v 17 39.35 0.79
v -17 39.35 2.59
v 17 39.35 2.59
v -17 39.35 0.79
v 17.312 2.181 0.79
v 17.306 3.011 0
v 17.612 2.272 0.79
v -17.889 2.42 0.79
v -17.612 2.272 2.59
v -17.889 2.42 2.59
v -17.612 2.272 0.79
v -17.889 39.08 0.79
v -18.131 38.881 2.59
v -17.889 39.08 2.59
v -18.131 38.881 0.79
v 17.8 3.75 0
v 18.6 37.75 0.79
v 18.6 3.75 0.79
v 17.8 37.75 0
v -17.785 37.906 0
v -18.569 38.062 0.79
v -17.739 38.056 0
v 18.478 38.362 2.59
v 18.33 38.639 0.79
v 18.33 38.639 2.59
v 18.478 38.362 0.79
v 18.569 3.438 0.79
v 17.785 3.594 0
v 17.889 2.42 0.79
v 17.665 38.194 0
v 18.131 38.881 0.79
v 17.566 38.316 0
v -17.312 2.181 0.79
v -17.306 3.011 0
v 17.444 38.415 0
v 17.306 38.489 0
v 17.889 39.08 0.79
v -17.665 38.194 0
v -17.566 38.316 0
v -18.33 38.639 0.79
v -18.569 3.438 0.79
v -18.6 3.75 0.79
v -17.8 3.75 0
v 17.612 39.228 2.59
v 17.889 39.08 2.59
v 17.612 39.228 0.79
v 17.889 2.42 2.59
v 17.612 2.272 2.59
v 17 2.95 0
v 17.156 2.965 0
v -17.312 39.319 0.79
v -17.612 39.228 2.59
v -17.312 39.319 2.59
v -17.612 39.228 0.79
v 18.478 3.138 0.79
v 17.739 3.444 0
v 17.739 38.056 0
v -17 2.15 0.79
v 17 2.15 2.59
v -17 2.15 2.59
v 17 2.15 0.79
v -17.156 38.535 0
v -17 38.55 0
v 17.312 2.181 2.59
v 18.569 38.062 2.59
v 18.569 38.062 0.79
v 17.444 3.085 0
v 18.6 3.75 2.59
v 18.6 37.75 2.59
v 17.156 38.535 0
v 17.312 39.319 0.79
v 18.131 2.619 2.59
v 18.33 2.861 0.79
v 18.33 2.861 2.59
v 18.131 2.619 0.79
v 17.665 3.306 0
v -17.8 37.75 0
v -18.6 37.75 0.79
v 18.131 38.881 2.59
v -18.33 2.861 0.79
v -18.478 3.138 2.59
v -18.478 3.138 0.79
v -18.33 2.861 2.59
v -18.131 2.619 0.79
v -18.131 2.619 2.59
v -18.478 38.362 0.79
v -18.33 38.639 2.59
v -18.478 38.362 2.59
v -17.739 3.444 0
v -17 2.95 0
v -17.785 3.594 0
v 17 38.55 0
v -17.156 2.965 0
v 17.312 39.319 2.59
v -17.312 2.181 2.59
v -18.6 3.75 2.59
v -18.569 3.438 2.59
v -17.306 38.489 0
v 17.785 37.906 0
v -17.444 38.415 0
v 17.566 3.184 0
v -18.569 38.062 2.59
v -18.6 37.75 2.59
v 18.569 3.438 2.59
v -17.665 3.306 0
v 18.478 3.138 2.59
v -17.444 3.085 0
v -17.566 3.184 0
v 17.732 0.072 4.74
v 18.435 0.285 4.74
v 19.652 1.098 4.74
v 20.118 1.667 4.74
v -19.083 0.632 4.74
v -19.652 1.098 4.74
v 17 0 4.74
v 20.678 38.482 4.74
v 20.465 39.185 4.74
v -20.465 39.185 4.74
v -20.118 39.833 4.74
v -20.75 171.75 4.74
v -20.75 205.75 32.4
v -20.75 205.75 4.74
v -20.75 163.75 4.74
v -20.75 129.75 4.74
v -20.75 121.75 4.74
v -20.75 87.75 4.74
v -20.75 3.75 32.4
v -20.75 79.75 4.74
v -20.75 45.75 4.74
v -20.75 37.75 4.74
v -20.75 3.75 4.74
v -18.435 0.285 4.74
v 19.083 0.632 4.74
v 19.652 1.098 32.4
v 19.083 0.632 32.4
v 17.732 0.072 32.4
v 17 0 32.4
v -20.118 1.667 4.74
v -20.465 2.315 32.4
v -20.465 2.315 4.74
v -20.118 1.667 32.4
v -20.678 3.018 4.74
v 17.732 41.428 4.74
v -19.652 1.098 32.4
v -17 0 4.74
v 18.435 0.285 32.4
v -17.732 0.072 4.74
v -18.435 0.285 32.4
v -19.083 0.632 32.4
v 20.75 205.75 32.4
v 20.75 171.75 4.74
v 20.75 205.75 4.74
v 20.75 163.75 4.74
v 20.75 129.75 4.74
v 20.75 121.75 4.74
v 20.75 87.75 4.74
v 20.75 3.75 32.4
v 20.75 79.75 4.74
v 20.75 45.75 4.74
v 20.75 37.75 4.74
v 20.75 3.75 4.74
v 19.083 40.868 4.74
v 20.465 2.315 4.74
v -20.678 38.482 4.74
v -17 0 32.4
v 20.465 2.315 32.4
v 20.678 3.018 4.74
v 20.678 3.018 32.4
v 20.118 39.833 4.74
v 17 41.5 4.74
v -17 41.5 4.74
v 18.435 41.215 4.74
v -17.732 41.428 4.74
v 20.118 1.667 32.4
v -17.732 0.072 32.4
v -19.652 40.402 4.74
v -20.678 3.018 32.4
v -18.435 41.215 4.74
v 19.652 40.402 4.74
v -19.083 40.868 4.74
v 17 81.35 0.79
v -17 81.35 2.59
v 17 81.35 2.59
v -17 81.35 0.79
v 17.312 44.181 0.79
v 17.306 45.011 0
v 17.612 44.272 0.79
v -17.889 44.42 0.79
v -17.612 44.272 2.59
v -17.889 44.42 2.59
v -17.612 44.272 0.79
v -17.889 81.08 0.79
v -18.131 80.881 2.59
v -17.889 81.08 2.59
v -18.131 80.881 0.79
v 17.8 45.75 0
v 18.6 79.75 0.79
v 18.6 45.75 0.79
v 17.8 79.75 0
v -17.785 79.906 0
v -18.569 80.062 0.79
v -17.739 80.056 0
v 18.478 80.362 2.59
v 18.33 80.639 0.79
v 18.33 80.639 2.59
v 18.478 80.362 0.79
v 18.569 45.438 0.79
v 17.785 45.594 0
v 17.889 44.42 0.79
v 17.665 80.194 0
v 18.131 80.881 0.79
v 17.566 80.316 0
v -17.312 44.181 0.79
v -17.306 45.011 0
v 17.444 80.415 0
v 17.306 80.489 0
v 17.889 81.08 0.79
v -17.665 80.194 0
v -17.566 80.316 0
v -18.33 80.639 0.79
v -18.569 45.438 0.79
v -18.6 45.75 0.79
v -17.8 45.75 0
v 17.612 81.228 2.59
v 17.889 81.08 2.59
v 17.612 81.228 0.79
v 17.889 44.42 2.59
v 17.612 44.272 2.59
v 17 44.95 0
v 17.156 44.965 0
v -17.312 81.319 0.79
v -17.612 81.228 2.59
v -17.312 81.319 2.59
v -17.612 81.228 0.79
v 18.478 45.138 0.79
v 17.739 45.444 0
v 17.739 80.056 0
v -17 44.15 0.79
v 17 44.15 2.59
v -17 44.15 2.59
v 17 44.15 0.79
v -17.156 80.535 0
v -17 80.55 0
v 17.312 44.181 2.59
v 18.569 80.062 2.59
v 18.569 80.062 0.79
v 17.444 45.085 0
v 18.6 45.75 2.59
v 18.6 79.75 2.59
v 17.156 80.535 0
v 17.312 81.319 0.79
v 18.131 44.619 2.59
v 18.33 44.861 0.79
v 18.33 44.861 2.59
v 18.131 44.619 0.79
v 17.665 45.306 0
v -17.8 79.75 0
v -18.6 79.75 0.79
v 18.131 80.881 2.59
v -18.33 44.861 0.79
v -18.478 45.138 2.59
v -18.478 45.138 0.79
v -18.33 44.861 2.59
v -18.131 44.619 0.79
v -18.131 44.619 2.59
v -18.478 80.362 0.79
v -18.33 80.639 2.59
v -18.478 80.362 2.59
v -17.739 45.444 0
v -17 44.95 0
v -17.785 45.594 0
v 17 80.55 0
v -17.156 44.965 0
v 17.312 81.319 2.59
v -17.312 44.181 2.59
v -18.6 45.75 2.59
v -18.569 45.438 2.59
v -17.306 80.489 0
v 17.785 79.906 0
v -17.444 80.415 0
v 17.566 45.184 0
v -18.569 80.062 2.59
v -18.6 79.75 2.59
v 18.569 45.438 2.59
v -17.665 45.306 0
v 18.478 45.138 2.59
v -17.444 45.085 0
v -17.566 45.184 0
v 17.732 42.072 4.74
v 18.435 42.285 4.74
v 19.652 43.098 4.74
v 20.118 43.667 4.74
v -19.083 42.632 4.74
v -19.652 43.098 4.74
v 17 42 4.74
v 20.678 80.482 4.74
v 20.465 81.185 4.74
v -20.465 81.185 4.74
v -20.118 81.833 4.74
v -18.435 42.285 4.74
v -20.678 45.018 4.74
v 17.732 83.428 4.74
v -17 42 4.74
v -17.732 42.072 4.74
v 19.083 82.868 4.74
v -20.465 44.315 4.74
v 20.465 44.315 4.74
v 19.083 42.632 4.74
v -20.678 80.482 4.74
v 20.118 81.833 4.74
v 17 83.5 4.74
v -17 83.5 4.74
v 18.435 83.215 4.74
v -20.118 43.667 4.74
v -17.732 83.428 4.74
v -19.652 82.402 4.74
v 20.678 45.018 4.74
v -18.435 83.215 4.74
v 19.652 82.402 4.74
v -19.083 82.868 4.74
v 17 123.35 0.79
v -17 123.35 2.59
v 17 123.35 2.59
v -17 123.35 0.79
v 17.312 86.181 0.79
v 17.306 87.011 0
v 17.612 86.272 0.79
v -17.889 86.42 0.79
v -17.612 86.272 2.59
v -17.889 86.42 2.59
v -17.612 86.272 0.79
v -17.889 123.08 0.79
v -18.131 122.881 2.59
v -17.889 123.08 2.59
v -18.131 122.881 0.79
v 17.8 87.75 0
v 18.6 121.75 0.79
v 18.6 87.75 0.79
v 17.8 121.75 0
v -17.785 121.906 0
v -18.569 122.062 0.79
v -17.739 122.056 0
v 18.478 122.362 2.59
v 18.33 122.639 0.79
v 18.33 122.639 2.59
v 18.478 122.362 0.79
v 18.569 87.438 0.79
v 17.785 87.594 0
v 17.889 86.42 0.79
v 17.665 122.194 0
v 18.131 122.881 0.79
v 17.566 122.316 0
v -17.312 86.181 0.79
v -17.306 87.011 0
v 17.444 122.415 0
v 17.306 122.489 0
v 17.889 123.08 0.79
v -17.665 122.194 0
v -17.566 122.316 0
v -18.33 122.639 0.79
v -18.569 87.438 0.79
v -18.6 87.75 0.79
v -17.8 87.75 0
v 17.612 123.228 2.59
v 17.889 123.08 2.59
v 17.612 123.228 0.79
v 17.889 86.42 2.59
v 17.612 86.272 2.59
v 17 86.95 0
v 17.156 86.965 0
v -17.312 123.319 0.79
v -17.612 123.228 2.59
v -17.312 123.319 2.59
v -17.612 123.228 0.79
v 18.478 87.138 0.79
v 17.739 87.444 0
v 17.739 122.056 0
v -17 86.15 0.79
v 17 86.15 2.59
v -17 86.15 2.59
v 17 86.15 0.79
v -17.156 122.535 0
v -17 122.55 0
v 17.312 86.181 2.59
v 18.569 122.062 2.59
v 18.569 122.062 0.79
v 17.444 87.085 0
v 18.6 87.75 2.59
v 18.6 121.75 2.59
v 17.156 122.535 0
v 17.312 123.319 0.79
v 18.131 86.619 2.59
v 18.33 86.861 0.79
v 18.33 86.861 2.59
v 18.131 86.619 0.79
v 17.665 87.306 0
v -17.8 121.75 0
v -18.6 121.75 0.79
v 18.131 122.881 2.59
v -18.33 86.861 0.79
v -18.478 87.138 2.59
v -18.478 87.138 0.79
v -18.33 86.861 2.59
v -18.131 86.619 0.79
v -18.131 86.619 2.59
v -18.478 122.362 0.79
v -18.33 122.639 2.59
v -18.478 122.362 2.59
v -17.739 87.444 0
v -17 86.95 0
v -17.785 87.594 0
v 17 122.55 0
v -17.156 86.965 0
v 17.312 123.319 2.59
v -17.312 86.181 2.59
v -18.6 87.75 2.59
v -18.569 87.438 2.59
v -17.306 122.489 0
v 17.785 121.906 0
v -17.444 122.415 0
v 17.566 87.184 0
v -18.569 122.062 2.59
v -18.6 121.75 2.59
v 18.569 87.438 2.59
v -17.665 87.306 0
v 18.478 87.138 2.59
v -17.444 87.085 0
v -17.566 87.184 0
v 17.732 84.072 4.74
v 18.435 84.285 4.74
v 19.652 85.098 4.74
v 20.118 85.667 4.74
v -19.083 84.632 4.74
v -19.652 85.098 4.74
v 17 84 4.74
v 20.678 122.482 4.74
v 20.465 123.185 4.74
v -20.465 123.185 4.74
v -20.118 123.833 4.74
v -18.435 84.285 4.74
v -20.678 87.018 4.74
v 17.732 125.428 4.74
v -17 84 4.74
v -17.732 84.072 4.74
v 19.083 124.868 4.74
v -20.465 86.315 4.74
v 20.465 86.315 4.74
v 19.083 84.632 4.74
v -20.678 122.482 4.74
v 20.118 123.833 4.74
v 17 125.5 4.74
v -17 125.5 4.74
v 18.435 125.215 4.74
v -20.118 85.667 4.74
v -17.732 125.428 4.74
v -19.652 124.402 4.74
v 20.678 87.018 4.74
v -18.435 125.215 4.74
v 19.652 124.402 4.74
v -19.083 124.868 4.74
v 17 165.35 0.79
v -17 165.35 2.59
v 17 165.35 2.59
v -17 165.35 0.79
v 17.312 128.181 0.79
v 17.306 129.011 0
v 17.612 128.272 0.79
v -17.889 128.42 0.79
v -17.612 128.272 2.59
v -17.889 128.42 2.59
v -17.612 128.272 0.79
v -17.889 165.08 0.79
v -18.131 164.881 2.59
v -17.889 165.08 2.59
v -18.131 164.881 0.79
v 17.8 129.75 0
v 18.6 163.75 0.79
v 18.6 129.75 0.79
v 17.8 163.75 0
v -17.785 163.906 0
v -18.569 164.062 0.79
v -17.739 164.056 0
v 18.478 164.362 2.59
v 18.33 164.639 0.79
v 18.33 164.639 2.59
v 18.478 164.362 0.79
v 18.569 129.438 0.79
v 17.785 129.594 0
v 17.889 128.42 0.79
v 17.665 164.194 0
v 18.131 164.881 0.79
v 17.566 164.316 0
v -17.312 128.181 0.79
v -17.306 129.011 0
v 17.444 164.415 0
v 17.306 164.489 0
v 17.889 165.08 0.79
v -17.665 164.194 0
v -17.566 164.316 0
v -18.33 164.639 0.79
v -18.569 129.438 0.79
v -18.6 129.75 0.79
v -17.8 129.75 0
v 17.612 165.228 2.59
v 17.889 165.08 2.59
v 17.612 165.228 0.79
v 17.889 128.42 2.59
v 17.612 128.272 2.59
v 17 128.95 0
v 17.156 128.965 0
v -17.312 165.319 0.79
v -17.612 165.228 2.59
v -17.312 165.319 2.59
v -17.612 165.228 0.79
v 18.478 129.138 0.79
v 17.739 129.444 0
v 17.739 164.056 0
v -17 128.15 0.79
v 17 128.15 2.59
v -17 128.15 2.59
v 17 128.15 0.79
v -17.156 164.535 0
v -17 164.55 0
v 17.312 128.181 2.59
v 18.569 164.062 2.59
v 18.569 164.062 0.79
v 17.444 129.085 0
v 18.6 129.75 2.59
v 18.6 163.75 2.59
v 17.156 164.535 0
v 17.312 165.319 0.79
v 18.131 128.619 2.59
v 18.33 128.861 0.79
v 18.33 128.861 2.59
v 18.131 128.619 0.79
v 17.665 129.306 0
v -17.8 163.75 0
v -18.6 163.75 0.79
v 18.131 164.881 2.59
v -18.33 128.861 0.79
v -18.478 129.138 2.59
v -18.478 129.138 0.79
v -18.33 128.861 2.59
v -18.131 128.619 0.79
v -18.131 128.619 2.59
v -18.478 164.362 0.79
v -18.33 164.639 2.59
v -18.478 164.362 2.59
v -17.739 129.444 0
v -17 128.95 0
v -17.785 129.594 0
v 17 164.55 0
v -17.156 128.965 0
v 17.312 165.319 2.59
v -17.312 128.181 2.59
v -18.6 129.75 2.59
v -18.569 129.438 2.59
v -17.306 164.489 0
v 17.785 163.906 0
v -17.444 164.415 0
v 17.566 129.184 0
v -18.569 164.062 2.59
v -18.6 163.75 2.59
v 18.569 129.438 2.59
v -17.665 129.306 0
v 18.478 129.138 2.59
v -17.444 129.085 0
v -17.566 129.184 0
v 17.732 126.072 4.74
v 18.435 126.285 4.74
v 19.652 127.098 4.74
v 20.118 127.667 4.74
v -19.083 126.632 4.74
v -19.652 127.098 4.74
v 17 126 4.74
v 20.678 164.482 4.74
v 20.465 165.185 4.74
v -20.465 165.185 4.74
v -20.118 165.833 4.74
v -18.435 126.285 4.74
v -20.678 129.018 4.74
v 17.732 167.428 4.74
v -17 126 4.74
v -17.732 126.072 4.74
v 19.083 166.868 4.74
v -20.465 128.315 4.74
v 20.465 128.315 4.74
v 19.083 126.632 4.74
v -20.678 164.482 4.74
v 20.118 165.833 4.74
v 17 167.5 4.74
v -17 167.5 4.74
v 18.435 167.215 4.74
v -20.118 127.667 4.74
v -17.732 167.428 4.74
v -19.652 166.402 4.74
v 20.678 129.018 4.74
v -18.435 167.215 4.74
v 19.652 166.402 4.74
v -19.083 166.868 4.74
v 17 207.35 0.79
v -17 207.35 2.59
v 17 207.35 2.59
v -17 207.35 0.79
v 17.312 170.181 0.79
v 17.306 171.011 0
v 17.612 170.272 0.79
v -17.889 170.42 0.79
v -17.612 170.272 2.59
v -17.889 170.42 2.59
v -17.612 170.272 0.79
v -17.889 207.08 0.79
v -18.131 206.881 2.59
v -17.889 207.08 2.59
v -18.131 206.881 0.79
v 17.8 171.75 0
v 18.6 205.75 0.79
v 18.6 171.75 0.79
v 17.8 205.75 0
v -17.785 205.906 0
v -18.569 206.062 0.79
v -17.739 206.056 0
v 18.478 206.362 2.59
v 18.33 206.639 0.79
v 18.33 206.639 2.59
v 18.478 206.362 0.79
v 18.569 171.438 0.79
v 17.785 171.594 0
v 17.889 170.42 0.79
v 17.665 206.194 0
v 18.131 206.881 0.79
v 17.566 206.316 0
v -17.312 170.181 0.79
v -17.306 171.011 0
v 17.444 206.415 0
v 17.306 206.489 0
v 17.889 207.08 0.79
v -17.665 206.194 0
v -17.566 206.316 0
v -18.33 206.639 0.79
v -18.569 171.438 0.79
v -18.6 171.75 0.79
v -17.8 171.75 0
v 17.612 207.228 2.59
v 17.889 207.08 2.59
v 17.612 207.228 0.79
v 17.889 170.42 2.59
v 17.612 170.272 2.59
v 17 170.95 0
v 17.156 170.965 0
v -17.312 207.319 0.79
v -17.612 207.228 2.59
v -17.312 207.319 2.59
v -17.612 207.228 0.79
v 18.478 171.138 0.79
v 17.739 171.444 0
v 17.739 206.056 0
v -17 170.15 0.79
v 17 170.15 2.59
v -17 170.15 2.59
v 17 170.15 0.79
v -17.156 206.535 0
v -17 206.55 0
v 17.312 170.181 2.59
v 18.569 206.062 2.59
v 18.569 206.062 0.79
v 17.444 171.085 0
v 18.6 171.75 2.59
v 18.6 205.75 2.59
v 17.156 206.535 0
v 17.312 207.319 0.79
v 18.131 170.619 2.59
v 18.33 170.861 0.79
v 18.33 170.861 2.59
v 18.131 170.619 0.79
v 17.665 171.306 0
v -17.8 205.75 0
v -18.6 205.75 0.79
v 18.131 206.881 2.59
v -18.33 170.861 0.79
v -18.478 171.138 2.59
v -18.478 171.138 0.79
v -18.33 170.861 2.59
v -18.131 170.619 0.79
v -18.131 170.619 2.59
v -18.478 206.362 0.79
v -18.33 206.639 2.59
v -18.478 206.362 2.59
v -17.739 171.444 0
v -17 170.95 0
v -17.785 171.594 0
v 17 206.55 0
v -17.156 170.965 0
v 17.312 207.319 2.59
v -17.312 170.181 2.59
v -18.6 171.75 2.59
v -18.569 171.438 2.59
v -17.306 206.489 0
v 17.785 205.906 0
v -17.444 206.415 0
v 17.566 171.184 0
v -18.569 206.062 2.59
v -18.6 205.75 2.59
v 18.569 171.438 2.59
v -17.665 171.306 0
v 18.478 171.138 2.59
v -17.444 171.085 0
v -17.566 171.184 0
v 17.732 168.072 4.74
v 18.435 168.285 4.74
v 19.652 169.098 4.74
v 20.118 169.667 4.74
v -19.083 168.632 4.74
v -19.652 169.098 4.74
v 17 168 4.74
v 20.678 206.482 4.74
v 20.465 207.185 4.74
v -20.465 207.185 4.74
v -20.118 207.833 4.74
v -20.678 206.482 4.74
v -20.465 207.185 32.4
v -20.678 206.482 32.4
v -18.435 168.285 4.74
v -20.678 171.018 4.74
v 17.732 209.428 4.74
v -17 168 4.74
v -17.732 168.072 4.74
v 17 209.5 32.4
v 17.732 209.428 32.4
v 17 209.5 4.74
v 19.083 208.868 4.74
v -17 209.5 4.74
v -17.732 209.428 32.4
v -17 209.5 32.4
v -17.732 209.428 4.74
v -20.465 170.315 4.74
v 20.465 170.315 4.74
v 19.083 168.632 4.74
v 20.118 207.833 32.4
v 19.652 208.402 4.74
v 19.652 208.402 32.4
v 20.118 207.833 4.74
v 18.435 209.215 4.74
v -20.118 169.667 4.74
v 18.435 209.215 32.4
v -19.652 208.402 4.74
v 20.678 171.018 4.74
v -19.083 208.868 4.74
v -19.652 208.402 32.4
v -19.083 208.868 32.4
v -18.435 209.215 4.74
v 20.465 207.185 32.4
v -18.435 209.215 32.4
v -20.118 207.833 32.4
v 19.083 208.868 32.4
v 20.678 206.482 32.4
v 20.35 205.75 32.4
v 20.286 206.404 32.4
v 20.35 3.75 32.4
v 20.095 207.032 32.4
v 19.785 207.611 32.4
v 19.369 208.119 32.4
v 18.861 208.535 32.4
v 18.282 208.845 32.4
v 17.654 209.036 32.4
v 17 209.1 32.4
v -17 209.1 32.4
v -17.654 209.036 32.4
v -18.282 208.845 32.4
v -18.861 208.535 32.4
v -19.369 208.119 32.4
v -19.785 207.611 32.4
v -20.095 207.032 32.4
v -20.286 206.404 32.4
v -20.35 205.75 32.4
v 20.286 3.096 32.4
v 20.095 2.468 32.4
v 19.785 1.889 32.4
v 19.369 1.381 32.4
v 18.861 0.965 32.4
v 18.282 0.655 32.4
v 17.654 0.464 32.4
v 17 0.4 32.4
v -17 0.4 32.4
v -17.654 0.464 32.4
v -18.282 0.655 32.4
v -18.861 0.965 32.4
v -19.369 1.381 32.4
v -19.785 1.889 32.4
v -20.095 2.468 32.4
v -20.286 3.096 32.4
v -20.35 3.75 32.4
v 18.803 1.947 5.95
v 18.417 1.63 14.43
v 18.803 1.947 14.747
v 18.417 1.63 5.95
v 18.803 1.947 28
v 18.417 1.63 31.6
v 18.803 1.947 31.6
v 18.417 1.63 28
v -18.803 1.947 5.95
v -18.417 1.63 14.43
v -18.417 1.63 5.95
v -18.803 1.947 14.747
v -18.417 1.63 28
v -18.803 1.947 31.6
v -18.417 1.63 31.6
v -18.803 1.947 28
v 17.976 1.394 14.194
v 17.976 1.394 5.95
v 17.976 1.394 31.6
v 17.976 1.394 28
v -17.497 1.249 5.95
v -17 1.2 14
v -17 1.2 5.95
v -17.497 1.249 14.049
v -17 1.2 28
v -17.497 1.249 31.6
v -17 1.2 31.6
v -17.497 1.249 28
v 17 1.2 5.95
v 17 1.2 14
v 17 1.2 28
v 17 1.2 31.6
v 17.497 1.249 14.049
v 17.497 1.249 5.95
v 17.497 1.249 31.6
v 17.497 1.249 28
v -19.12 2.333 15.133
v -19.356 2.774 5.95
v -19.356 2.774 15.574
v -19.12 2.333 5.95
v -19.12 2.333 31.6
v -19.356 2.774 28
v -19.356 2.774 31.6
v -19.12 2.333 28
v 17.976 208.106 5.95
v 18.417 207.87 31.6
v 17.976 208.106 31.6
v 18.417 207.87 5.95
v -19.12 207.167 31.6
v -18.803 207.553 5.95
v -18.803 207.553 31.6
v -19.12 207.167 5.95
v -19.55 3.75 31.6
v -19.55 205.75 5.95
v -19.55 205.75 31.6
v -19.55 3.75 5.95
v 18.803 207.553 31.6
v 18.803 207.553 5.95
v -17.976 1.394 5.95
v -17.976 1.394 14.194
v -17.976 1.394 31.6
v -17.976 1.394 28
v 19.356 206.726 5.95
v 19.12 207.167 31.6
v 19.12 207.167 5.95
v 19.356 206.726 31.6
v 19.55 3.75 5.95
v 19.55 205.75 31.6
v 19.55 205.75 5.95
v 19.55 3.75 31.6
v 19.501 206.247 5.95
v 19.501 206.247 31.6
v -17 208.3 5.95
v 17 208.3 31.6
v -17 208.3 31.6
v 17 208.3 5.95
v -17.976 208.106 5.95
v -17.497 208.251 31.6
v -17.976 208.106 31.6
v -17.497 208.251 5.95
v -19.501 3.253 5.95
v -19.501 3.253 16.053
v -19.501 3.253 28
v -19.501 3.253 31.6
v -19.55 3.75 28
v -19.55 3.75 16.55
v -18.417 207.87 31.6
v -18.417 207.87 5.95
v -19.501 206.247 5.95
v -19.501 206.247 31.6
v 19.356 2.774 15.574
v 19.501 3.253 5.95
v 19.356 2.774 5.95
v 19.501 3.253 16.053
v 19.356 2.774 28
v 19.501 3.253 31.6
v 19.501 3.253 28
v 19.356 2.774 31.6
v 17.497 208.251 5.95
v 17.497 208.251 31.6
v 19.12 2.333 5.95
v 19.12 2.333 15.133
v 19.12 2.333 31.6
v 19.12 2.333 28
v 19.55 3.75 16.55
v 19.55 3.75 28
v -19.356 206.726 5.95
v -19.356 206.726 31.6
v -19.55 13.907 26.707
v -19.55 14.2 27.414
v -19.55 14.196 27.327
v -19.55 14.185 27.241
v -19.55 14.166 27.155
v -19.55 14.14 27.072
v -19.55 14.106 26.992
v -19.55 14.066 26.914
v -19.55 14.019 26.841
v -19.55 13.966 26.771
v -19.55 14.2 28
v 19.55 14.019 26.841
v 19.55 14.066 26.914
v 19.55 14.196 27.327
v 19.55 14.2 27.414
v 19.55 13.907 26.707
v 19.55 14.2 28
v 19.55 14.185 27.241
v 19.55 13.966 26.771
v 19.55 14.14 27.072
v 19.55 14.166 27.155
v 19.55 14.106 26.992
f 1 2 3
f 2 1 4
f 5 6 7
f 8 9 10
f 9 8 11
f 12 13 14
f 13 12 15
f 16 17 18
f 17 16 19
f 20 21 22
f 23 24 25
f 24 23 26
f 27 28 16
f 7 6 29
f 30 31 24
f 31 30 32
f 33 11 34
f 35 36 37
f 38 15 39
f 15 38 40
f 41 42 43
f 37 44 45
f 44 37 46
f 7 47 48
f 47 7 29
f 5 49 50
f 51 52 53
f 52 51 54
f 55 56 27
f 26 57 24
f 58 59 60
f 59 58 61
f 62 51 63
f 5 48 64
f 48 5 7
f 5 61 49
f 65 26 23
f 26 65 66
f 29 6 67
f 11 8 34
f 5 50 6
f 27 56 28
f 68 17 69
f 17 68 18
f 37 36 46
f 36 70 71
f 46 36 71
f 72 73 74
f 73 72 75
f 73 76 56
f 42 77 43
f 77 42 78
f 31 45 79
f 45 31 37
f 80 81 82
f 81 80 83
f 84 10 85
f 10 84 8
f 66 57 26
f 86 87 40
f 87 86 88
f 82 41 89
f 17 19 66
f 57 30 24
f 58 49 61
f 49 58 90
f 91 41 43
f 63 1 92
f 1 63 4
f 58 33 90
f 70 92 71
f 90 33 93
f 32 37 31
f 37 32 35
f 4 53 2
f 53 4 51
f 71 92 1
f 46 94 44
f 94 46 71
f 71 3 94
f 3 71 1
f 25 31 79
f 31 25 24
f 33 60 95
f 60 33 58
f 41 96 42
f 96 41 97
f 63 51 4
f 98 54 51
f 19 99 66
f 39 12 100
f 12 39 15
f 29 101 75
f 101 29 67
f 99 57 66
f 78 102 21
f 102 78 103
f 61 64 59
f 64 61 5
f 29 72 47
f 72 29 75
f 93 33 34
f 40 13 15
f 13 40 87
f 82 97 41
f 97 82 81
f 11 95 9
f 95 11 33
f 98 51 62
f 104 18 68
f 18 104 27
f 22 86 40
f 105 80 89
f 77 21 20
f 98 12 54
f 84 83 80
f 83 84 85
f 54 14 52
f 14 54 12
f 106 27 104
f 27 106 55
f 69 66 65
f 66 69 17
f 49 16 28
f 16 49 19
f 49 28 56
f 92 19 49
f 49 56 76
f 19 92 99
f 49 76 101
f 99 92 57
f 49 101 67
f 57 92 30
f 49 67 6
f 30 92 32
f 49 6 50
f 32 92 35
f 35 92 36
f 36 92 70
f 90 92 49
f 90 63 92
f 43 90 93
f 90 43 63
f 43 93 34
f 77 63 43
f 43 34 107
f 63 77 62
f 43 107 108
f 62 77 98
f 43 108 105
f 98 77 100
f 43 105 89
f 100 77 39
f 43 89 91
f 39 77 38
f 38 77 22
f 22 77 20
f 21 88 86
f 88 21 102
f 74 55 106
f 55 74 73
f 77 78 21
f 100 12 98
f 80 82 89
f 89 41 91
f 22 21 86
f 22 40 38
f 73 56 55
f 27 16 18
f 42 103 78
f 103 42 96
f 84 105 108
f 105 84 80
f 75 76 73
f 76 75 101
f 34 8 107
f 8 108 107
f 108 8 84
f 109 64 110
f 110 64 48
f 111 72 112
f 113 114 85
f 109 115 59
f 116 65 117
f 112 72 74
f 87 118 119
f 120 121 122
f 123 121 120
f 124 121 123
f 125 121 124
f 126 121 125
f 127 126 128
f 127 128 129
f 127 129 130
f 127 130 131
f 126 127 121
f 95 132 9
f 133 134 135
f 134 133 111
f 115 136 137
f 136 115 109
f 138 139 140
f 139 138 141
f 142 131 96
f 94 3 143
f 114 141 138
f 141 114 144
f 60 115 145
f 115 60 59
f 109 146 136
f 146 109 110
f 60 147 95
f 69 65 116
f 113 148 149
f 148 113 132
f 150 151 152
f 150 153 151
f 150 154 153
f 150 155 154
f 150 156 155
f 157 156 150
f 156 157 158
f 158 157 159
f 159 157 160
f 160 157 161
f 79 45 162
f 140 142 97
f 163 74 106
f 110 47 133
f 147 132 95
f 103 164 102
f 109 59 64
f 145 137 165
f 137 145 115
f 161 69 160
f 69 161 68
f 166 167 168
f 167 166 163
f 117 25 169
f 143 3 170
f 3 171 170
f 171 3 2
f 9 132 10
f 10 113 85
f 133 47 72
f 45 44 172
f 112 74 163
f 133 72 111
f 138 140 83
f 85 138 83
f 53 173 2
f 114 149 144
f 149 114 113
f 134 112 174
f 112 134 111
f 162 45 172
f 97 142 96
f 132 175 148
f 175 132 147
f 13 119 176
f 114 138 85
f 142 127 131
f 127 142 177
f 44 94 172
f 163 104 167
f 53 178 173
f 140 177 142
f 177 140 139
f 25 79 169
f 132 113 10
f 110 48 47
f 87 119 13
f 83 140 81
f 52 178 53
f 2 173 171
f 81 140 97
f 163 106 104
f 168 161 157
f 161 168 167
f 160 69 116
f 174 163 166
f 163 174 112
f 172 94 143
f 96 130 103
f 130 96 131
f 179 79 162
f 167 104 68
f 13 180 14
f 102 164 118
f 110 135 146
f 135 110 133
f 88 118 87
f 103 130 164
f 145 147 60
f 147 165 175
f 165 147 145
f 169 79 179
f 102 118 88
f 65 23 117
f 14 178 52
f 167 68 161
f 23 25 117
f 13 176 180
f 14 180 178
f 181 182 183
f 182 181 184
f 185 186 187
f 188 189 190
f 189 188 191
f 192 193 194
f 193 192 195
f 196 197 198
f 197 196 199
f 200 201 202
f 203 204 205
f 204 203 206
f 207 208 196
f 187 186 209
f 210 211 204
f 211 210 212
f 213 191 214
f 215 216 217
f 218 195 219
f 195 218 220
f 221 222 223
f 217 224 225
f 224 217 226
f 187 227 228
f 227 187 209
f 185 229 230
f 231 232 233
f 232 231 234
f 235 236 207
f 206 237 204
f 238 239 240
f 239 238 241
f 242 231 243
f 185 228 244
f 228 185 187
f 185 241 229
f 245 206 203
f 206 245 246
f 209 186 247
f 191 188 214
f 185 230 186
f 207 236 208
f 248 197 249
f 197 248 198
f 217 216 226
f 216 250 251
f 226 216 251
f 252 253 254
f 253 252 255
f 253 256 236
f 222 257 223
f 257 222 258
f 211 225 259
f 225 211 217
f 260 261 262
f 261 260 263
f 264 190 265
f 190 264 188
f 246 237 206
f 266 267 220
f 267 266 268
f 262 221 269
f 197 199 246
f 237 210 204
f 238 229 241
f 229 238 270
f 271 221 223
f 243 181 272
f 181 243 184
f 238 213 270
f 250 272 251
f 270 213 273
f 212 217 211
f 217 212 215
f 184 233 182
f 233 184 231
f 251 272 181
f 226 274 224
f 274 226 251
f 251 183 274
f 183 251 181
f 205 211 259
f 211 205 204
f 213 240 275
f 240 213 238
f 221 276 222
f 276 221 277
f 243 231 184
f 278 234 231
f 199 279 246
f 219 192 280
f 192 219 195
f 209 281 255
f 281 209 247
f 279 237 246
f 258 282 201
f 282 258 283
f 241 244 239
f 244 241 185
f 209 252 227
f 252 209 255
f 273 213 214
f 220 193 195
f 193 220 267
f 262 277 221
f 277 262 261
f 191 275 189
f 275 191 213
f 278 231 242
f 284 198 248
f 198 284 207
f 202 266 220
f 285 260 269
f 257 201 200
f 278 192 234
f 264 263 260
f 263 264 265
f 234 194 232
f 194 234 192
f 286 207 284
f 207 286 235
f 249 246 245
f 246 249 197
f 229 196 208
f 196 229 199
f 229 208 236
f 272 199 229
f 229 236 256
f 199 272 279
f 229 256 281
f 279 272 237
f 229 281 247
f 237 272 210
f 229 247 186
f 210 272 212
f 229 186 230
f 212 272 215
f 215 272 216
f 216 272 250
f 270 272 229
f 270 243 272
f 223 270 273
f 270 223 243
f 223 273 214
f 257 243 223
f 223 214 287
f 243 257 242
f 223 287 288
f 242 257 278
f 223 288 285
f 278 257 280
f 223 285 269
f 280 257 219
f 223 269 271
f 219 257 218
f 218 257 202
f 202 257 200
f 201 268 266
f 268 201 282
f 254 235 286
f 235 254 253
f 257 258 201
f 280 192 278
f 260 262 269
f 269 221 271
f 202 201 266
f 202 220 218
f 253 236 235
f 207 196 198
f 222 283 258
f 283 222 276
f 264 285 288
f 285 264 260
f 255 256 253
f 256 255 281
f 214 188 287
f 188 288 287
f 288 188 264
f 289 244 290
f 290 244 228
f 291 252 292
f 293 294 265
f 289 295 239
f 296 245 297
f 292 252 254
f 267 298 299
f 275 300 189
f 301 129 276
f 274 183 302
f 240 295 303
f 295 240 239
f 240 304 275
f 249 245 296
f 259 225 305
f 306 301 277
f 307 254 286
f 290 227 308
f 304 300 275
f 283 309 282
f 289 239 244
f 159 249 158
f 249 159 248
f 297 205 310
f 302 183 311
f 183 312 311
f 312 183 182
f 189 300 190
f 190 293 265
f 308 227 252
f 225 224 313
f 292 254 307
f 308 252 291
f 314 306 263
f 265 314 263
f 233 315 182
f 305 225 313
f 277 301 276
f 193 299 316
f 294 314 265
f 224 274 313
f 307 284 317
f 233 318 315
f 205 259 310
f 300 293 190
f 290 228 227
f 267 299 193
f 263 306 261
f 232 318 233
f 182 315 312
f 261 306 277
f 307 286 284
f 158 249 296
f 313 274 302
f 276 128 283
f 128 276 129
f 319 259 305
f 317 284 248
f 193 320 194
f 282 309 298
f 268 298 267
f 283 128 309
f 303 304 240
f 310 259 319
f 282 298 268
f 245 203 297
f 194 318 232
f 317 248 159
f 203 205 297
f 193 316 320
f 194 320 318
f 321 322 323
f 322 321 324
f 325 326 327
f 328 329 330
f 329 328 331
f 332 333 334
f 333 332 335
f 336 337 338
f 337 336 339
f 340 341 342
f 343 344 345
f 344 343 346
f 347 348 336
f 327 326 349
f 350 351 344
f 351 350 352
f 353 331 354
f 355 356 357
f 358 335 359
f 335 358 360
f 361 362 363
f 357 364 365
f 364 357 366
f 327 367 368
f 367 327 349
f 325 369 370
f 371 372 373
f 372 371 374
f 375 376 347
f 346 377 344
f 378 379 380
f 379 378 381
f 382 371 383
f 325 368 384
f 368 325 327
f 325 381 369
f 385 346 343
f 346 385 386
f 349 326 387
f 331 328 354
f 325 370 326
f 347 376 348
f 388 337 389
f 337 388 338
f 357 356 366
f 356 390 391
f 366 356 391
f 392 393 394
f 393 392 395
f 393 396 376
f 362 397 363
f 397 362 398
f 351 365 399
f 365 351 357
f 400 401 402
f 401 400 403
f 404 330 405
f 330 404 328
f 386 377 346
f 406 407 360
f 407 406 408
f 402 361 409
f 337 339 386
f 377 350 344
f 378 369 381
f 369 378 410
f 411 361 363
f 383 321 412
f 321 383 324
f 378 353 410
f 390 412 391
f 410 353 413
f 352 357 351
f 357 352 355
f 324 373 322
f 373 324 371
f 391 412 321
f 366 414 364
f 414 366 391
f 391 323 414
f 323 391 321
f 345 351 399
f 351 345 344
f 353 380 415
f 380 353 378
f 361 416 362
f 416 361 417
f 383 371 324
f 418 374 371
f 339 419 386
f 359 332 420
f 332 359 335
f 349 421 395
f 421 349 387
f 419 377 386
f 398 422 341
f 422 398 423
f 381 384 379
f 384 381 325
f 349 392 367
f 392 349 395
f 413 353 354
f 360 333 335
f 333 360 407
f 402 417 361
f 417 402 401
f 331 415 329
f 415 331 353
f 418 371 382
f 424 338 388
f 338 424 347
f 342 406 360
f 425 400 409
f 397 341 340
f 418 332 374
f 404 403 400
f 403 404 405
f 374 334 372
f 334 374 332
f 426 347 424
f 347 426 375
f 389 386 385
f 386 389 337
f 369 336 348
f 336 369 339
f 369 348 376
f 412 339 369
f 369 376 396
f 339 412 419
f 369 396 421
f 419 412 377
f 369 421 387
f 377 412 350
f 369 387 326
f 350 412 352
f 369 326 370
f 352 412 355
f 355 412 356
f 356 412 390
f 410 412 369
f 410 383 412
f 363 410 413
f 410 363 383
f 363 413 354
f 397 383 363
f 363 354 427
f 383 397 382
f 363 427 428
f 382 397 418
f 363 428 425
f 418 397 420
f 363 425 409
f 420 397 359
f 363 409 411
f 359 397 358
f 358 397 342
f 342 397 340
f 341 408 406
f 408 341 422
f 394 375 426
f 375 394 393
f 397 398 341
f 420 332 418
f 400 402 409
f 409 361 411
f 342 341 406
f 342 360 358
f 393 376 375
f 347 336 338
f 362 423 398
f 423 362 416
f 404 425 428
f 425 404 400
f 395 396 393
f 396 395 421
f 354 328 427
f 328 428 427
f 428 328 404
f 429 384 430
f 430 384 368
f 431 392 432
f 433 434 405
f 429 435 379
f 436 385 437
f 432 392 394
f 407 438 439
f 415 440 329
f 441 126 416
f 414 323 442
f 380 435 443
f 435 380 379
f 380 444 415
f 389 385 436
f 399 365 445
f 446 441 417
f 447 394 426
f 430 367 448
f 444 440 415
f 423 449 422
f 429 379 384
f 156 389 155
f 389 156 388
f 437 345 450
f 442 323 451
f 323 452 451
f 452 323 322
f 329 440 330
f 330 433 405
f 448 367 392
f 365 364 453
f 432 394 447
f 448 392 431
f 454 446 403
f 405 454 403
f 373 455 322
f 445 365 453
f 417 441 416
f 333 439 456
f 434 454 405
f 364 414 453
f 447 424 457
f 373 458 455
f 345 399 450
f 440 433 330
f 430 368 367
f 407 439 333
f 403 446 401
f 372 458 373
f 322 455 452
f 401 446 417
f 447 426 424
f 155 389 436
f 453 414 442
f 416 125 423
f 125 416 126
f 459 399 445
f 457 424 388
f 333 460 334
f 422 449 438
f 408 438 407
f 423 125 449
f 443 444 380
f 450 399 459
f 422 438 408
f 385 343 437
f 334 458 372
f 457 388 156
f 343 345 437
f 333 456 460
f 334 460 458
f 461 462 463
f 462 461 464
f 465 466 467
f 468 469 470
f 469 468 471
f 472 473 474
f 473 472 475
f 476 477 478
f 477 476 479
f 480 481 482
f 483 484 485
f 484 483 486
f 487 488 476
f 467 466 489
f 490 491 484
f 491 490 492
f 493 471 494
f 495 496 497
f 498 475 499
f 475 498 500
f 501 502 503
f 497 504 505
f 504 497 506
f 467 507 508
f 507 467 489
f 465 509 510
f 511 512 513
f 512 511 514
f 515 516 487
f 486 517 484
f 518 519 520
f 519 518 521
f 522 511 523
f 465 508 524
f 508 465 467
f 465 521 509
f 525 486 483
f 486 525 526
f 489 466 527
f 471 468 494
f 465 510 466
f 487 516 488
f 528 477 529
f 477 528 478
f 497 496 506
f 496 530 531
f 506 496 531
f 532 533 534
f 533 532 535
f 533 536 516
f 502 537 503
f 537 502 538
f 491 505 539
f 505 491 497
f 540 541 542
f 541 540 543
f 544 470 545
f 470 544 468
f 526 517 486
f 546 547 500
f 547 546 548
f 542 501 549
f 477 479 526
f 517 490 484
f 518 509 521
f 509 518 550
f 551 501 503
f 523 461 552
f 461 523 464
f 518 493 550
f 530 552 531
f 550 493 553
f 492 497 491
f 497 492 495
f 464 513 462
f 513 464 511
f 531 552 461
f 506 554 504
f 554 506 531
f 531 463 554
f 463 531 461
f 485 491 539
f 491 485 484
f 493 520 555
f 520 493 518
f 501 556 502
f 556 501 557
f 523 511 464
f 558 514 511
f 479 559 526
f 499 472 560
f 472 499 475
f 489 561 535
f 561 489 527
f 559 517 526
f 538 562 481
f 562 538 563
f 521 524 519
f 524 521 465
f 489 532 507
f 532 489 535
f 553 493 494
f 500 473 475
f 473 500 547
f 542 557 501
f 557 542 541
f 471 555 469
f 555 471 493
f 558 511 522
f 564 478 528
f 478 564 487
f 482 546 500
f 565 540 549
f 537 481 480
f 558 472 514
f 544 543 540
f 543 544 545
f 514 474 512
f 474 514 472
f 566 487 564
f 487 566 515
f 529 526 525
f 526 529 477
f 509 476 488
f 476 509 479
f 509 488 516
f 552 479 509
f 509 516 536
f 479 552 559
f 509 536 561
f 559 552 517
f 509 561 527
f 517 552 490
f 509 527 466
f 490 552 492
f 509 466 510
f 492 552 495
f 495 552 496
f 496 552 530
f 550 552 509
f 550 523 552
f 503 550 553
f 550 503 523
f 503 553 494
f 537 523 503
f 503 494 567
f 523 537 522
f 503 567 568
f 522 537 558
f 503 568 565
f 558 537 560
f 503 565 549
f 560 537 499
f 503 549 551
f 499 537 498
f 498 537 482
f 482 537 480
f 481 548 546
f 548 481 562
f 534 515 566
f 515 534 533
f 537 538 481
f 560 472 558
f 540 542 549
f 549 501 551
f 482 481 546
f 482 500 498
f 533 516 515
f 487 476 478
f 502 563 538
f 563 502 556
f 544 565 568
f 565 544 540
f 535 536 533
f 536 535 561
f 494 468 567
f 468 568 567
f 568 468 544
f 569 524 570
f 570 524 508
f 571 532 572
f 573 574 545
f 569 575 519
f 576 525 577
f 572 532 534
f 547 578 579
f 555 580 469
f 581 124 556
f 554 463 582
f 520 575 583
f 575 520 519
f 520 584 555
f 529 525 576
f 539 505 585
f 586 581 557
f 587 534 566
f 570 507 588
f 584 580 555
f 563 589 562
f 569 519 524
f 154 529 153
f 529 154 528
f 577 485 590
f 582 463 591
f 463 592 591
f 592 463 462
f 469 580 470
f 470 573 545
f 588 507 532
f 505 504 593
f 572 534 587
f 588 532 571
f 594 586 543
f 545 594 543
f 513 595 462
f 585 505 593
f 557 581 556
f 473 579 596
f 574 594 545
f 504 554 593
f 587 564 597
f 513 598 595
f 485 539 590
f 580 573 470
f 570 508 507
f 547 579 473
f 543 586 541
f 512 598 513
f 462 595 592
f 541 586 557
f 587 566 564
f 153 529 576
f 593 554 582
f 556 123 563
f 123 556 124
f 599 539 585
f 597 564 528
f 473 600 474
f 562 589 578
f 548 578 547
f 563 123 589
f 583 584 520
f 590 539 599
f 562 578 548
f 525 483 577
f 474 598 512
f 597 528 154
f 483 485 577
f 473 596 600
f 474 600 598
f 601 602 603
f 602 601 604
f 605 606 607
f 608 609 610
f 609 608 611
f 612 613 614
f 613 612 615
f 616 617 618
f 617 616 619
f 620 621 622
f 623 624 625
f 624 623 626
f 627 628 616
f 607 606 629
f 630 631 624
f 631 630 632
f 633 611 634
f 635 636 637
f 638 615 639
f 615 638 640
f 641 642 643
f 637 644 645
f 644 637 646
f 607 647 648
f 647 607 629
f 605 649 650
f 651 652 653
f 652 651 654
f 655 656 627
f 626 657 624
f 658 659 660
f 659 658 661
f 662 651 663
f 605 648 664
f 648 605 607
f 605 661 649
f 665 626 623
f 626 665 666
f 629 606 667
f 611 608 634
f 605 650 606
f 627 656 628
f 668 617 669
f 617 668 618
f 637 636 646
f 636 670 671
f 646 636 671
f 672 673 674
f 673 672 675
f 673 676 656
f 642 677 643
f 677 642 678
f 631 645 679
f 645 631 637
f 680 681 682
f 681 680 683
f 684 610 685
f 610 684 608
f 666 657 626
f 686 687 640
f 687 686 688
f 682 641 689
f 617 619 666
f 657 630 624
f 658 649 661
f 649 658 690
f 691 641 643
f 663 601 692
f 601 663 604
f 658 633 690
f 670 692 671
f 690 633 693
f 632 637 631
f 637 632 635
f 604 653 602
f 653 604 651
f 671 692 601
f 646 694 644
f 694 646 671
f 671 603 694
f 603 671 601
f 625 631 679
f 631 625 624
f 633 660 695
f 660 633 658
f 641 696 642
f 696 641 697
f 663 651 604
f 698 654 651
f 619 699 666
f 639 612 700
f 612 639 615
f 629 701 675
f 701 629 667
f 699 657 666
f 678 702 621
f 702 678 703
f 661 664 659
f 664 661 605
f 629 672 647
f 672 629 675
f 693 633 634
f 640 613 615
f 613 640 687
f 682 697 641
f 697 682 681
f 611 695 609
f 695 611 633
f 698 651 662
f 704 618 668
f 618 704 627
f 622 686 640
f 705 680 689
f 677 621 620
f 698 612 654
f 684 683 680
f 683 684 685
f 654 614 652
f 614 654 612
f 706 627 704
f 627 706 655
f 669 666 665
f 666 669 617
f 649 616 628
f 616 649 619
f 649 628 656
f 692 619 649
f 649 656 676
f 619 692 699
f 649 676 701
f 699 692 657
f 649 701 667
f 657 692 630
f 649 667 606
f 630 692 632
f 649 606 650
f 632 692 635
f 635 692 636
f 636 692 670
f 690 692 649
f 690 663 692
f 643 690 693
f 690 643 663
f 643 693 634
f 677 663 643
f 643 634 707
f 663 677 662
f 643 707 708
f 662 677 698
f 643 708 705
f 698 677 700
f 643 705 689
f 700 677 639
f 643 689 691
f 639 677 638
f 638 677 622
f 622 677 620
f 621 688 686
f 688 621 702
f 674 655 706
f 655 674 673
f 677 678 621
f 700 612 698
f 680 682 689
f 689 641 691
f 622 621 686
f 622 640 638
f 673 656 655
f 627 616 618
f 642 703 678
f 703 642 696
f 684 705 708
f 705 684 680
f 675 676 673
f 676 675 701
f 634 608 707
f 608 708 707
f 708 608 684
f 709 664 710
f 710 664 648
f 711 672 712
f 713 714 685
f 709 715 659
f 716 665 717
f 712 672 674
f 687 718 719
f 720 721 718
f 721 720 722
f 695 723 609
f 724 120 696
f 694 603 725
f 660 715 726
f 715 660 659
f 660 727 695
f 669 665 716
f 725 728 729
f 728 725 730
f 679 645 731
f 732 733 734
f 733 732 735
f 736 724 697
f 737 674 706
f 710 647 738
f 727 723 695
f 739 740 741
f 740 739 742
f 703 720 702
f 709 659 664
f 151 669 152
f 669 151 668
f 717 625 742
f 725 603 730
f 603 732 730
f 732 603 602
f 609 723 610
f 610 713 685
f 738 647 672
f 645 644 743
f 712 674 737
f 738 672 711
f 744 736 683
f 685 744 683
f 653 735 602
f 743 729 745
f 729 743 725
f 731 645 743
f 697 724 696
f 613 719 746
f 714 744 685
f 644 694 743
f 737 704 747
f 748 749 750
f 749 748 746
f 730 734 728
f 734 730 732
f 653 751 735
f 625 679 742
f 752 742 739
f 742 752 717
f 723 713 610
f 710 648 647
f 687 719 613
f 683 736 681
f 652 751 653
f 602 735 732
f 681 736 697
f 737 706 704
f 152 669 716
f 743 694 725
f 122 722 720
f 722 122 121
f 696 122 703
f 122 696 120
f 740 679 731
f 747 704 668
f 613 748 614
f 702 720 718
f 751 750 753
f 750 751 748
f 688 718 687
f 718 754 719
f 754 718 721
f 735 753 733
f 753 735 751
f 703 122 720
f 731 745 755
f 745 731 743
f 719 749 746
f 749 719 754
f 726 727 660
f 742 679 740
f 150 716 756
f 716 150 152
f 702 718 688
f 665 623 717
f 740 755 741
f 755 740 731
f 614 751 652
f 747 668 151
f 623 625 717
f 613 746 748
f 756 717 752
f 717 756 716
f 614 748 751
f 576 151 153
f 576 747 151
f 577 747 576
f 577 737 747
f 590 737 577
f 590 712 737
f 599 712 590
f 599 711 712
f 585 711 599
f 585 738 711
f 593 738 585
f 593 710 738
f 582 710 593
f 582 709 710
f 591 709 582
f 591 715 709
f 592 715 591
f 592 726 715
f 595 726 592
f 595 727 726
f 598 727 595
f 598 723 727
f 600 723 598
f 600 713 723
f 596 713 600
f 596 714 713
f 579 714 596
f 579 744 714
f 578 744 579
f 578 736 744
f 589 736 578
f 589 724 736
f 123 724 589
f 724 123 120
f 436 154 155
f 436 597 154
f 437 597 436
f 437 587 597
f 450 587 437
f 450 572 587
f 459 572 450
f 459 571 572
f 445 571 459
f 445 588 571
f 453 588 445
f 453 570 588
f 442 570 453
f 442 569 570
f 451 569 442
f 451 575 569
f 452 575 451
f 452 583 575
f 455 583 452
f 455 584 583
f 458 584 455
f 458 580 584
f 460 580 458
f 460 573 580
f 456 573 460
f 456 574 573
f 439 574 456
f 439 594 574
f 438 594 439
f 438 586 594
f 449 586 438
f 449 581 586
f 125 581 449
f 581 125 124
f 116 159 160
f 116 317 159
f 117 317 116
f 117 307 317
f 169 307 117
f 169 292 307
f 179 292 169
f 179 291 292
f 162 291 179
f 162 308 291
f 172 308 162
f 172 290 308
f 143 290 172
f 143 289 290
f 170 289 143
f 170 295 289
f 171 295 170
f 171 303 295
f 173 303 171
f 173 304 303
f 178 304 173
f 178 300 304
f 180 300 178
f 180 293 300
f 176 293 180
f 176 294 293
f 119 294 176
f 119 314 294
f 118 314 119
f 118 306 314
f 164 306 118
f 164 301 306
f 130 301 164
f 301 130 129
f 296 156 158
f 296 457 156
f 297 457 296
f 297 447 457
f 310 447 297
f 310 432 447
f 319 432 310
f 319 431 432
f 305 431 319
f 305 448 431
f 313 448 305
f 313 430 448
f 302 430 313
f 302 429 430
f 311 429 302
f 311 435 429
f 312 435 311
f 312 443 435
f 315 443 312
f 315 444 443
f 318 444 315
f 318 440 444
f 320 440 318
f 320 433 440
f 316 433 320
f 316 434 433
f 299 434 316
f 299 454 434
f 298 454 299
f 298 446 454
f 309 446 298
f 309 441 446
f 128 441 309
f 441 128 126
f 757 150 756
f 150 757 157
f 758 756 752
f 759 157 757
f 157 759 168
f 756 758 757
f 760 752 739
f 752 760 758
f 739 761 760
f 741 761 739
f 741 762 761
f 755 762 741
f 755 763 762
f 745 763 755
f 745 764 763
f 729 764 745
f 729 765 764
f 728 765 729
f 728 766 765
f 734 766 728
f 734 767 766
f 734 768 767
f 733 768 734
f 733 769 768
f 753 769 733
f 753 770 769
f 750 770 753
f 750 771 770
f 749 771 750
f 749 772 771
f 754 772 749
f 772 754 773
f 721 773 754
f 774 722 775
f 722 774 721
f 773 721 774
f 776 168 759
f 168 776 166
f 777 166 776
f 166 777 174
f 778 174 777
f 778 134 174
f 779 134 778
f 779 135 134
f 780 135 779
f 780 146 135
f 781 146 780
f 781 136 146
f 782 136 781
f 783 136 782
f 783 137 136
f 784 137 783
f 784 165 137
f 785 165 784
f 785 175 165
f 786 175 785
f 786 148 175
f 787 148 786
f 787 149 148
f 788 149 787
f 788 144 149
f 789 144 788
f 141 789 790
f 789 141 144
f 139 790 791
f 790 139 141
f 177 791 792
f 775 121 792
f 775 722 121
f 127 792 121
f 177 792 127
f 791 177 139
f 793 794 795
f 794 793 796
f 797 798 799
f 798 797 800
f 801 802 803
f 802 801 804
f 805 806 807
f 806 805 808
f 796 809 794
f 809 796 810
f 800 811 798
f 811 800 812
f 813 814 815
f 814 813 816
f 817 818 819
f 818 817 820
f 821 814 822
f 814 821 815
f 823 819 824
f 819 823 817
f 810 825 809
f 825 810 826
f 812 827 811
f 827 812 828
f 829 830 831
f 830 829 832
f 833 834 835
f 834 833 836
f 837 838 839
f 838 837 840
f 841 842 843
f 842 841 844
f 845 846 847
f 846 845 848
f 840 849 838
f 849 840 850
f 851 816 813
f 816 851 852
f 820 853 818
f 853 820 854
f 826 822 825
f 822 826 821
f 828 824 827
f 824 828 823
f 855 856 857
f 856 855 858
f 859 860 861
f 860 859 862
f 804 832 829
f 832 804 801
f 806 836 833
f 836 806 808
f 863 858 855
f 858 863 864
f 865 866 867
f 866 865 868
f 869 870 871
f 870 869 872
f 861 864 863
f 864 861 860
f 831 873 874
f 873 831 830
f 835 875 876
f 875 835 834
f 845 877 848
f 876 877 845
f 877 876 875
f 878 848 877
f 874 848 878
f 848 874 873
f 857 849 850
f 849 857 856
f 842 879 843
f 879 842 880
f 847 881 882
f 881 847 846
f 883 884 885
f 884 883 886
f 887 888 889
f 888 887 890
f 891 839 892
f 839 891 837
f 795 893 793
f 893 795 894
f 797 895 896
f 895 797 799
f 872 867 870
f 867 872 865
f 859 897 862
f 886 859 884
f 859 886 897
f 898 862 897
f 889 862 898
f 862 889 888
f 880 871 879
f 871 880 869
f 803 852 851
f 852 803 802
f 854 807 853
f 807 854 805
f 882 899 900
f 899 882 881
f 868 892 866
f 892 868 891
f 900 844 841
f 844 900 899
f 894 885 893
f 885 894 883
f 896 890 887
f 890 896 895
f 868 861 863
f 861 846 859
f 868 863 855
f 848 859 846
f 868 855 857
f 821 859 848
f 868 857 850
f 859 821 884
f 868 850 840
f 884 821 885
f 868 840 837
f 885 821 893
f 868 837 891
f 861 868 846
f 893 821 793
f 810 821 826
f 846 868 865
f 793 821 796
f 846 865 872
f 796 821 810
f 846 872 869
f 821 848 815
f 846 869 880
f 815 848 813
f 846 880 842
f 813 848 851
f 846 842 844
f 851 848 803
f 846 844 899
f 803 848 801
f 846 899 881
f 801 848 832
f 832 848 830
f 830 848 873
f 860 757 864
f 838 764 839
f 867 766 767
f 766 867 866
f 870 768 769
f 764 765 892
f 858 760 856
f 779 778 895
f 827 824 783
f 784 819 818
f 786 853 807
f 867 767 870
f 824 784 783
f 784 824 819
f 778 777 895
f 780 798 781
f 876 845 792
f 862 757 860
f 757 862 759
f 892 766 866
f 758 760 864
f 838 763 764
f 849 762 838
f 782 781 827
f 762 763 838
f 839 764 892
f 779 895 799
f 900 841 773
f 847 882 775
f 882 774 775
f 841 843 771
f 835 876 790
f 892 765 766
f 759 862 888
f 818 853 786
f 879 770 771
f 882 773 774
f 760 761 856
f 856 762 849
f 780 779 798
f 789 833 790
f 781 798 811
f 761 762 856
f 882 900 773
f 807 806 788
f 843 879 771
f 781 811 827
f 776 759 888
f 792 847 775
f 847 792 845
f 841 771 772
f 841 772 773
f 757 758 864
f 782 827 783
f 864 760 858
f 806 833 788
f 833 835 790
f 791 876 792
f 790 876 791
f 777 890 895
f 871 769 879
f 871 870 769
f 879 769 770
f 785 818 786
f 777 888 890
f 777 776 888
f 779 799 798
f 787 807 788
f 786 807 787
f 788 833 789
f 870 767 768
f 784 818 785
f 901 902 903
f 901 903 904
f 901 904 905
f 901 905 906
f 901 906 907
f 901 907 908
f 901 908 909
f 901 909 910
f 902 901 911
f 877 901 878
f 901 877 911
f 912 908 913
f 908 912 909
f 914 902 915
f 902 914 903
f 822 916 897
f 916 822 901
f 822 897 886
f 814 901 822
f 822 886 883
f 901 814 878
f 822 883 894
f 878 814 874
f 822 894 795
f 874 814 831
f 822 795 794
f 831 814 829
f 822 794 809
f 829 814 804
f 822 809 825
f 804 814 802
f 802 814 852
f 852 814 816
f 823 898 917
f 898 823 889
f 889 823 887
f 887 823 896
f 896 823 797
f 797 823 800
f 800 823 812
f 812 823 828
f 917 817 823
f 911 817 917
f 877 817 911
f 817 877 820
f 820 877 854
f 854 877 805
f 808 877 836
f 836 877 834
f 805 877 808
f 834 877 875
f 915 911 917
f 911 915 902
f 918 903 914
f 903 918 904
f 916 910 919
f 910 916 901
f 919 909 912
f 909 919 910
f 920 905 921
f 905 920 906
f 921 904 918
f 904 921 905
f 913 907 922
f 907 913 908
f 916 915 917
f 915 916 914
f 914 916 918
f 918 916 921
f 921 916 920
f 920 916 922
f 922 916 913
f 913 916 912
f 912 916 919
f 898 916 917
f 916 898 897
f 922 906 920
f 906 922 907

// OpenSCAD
// file: ../../../modules/gridfinity.scad
// Gridfinity ベースプレートの共有 module。
// 寸法は Gridfinity 仕様 (Zack Freedman) の baseplate 輪郭に従う:
//   ピッチ 42、ソケット上端開口 41.5 (角 R4)、上から 45° 面取り 2.15 →
//   垂直 1.8 (37.2 角・R1.85) → 45° 面取り 0.7 → 底 35.8 角 (R1.15)。
//   ソケット深さ = 2.15 + 1.8 + 0.7 = 4.65。
//
// 座標系: X が列方向 (中央が 0)、Y が行方向 (板の前端が 0)、Z=0 が板の底面。
// 板の外形は grid とは独立に rim で与えるので、grid より大きい板 (縁付き) を
// 作れる。ソケットは rim=[left, right, front, back] の内側へ 42 ピッチで並ぶ。

gf_pitch = 42;
gf_socket_top = 41.5; // 上端開口
gf_socket_mid = 37.2; // 垂直部
gf_socket_bot = 35.8; // 底
gf_socket_r_top = 4;
gf_socket_r_mid = 1.85;
gf_socket_r_bot = 1.15;
gf_chamfer_top = 2.15;
gf_wall_h = 1.8;
gf_chamfer_bot = 0.7;
gf_socket_depth = gf_chamfer_top + gf_wall_h + gf_chamfer_bot; // 4.65
gf_fn = 32;
gf_eps = 0.01; // hull 用の薄板の厚さ
gf_over = 0.5; // 切削の抜き代

// 角丸正方形または矩形 (w は一辺、または [幅, 奥行き]、角 R)
module
gf_rounded_square(w, r)
{
    offset(r = r, $fn = gf_fn)
        square(is_list(w) ? w - [ 2 * r, 2 * r ] : w - 2 * r, center = true);
}

// 厚さ gf_eps の角丸正方形の薄板を z に置く (hull の骨)
module
gf_slab(w, r, z)
{
    translate([ 0, 0, z ]) linear_extrude(gf_eps) gf_rounded_square(w, r);
}

// ソケット1個の切削体。z=0 がソケットの底 (床の天面)、+Z へ 4.65 で天面に出る。
// clearance は嵌合の逃げで、輪郭を全周へ clearance だけ外へ出す (幅 +2c、角 R
// +c)。pitch_x は X 方向のセル幅。端数でも角 R と面取りの寸法を保つ。
module
gf_socket_cut(clearance = 0, pitch_x = gf_pitch)
{
    z1 = gf_chamfer_bot;
    z2 = z1 + gf_wall_h;
    z3 = gf_socket_depth;
    c = clearance;
    assert(pitch_x > gf_pitch - gf_socket_top + 2 * gf_socket_r_top,
           "Cell width is too small for the socket corner radius");
    delta = [ pitch_x - gf_pitch, 0 ];
    bot = [ gf_socket_bot + 2 * c, gf_socket_bot + 2 * c ] + delta;
    mid = [ gf_socket_mid + 2 * c, gf_socket_mid + 2 * c ] + delta;
    top = [ gf_socket_top + 2 * c, gf_socket_top + 2 * c ] + delta;
    hull()
    {
        gf_slab(bot, gf_socket_r_bot + c, 0);
        gf_slab(mid, gf_socket_r_mid + c, z1 - gf_eps);
    }
    hull()
    {
        gf_slab(mid, gf_socket_r_mid + c, z1 - gf_eps);
        gf_slab(mid, gf_socket_r_mid + c, z2 - gf_eps);
    }
    hull()
    {
        gf_slab(mid, gf_socket_r_mid + c, z2 - gf_eps);
        gf_slab(top, gf_socket_r_top + c, z3 - gf_eps);
    }
    // 天面より上へ抜く (天面と同一平面の退化した面を残さない)
    gf_slab(top, gf_socket_r_top + c, z3 - gf_eps);
    translate([ 0, 0, z3 - gf_eps ]) linear_extrude(gf_over + gf_eps)
        gf_rounded_square(top, gf_socket_r_top + c);
}

// ベースプレート。cols x rows のソケットを床 floor_t の上に彫る。
// rim = [left, right, front, back] はソケット列の外側に残す縁の幅。
// 板の幅 = cols*42 + left + right、奥行き = rows*42 + front + back。
// cols の端数は左端の細幅セルになる。rows は正の整数。
// clearance はソケットの嵌合の逃げ (gf_socket_cut を参照)。
module
gf_baseplate(cols, rows, rim = [ 0, 0, 0, 0 ], floor_t = 1, clearance = 0)
{
    grid_w = cols * gf_pitch;
    grid_d = rows * gf_pitch;
    plate_w = grid_w + rim[0] + rim[1];
    plate_d = grid_d + rim[2] + rim[3];
    x0 = -plate_w / 2 + rim[0]; // ソケット列の左端
    first_pitch = grid_w - (ceil(cols) - 1) * gf_pitch;
    difference()
    {
        translate([ -plate_w / 2, 0, 0 ])
            cube([ plate_w, plate_d, floor_t + gf_socket_depth ]);
        for (c = [0:ceil(cols) - 1], r = [0:rows - 1])
            translate([
                x0 + (c == 0 ? first_pitch / 2
                             : first_pitch + (c - 0.5) * gf_pitch),
                rim[2] + (r + 0.5) * gf_pitch,
                floor_t
            ]) gf_socket_cut(clearance, c == 0 ? first_pitch : gf_pitch);
    }
}
// file: ../../../modules/gridfinity_bins.scad
include <gridfinity_bin.scad>

// assets/gridfinity-bin/ の bin 群の共通値と、サイズ 3 引数の払い出し口。
// 単体では何も描かない。設計の経緯と確定値は
// ledger/designs/gridfinity-bin-4u.md が正本。
// 通常binは4U/9U、X={1,1.5,2,2.5,3} × Y={1,2,3,4,5,5.5}。
// 両軸に端数を持つ組み合わせはassetに置かない（各高さ28種）。
// Xが横、Yがラベルの壁から奥、unitsが高さ（7mm単位）。
wall = 1.2;    // 0.4 ノズル 3 本
floor_t = 1.2; // 底 (4.75) の上に載せる床。床の天面 z = 5.95
label_d = 13;  // 12mm 幅のラベルシールを貼る天板の張り出し
label_t = 1; // 天板の厚さ (user 指定)。下は 45° の無垢のくさび
label_r = 1; // 天板の先端と 45° 面の境目の R (user 指定)
// カードケース (goods/card_case_2x3x4u.scad) の値。カードは ISO/IEC 7810 ID-1 (85.6 × 54 ×
// 0.76、隅 R3) で、長辺を Y (rows 方向) に寝かせ、X 中央・手前の壁から 10 奥に置く。ポケットは
// カードより 1 大きい (片側 0.5)。右奥のマスは壁の内面まで抜き、床と底を外形に平行な 45° の窪みにする。
// ポケットの左右の埋めの天面 (幅 13.05) が 12mm のラベルを貼る帯。ポケットと穴の交点の
// 縦エッジは丸める (開口の上縁は丸めない: 壁を上端まで垂直に保ち、収まる枚数を減らさない)
card_w = 54;    // カードの短辺 (X)。user 指定「高さ 54」
card_d = 85.6;  // カードの長辺 (Y)。user 指定「幅 85.6」
card_clear = 1; // ポケットの余裕 (user 指定「+1mm」)
// ポケットの手前の辺の、手前の壁の内面からの距離 (user 指定「10mm」)
card_off = 10;
// ポケットの平面の隅 R (user 指定「角の丸み 3mm」。ID-1 の隅は 2.88..3.48)
card_r = 3;
// ポケットと穴が交わる所の、埋めの凸の縦エッジの R (指の当たる角)
card_edge_r = 2;
recess_skin = floor_t + 1.75; // 窪みの床 z (底の皮)。user 指定「壁厚と同じ 1.2 は過剰、1.75 返す」

function bin_contract(cols, rows, units) = str("CONTRACT units=",
                                               units,
                                               " pitch=",
                                               gf_pitch,
                                               " outer=",
                                               gfb_outer,
                                               " h=",
                                               units* gfb_unit,
                                               " lip=",
                                               gfb_lip_h,
                                               " base=",
                                               gfb_base_bot,
                                               "/",
                                               gfb_base_mid,
                                               "/",
                                               gfb_outer,
                                               " base_h=",
                                               gfb_base_h,
                                               " wall=",
                                               wall,
                                               " floor_top=",
                                               gfb_base_h + floor_t,
                                               " label=",
                                               label_d,
                                               "x",
                                               label_t,
                                               " wedge=45 fillet=",
                                               label_r,
                                               " bin=",
                                               cols,
                                               "x",
                                               rows,
                                               " size=",
                                               cols* gf_pitch - 0.5,
                                               "x",
                                               rows* gf_pitch - 0.5);

// (cols, rows, units) でラベル付き bin を払い出す。例: gridfinity_bin(2, 4, 4)
module
gridfinity_bin(cols, rows, units = 4)
{
    echo(bin_contract(cols, rows, units));
    gfb_bin(cols, rows, units, wall, floor_t, label_d, label_t, label_r);
}

function card_contract(cols, rows, units) = str("CONTRACT card units=",
                                                units,
                                                " bin=",
                                                cols,
                                                "x",
                                                rows,
                                                " size=",
                                                cols* gf_pitch - 0.5,
                                                "x",
                                                rows* gf_pitch - 0.5,
                                                " h=",
                                                units* gfb_unit,
                                                " lip=",
                                                gfb_lip_h,
                                                " floor_top=",
                                                gfb_base_h + floor_t,
                                                " card=",
                                                card_w,
                                                "x",
                                                card_d,
                                                " pocket=",
                                                card_w + card_clear,
                                                "x",
                                                card_d + card_clear,
                                                " at=",
                                                -(card_w + card_clear) / 2,
                                                ",",
                                                wall + card_off,
                                                " hole=",
                                                (cols - 1) / 2 * gf_pitch - gfb_outer / 2,
                                                ",",
                                                (rows - 0.5) * gf_pitch - 0.25 - gfb_outer / 2,
                                                " hole_r=",
                                                gfb_outer_r - wall,
                                                " recess=",
                                                gfb_outer - 2 * wall,
                                                "/",
                                                gfb_base_mid - 2 * wall,
                                                " recess_floor=",
                                                recess_skin,
                                                " r=",
                                                card_r,
                                                " edge_r=",
                                                card_edge_r);

// (cols, rows, units) でカードケースを払い出す。例: gridfinity_card_case(2, 3, 4)
module
gridfinity_card_case(cols, rows, units = 4)
{
    echo(card_contract(cols, rows, units));
    gfb_card_case(cols,
                  rows,
                  units,
                  wall,
                  floor_t,
                  [ card_w, card_d ],
                  card_clear,
                  card_off,
                  card_r,
                  recess_skin,
                  card_edge_r);
}
// main file
include <../../../modules/gridfinity_bins.scad>

gridfinity_bin(1, 5, 4);
